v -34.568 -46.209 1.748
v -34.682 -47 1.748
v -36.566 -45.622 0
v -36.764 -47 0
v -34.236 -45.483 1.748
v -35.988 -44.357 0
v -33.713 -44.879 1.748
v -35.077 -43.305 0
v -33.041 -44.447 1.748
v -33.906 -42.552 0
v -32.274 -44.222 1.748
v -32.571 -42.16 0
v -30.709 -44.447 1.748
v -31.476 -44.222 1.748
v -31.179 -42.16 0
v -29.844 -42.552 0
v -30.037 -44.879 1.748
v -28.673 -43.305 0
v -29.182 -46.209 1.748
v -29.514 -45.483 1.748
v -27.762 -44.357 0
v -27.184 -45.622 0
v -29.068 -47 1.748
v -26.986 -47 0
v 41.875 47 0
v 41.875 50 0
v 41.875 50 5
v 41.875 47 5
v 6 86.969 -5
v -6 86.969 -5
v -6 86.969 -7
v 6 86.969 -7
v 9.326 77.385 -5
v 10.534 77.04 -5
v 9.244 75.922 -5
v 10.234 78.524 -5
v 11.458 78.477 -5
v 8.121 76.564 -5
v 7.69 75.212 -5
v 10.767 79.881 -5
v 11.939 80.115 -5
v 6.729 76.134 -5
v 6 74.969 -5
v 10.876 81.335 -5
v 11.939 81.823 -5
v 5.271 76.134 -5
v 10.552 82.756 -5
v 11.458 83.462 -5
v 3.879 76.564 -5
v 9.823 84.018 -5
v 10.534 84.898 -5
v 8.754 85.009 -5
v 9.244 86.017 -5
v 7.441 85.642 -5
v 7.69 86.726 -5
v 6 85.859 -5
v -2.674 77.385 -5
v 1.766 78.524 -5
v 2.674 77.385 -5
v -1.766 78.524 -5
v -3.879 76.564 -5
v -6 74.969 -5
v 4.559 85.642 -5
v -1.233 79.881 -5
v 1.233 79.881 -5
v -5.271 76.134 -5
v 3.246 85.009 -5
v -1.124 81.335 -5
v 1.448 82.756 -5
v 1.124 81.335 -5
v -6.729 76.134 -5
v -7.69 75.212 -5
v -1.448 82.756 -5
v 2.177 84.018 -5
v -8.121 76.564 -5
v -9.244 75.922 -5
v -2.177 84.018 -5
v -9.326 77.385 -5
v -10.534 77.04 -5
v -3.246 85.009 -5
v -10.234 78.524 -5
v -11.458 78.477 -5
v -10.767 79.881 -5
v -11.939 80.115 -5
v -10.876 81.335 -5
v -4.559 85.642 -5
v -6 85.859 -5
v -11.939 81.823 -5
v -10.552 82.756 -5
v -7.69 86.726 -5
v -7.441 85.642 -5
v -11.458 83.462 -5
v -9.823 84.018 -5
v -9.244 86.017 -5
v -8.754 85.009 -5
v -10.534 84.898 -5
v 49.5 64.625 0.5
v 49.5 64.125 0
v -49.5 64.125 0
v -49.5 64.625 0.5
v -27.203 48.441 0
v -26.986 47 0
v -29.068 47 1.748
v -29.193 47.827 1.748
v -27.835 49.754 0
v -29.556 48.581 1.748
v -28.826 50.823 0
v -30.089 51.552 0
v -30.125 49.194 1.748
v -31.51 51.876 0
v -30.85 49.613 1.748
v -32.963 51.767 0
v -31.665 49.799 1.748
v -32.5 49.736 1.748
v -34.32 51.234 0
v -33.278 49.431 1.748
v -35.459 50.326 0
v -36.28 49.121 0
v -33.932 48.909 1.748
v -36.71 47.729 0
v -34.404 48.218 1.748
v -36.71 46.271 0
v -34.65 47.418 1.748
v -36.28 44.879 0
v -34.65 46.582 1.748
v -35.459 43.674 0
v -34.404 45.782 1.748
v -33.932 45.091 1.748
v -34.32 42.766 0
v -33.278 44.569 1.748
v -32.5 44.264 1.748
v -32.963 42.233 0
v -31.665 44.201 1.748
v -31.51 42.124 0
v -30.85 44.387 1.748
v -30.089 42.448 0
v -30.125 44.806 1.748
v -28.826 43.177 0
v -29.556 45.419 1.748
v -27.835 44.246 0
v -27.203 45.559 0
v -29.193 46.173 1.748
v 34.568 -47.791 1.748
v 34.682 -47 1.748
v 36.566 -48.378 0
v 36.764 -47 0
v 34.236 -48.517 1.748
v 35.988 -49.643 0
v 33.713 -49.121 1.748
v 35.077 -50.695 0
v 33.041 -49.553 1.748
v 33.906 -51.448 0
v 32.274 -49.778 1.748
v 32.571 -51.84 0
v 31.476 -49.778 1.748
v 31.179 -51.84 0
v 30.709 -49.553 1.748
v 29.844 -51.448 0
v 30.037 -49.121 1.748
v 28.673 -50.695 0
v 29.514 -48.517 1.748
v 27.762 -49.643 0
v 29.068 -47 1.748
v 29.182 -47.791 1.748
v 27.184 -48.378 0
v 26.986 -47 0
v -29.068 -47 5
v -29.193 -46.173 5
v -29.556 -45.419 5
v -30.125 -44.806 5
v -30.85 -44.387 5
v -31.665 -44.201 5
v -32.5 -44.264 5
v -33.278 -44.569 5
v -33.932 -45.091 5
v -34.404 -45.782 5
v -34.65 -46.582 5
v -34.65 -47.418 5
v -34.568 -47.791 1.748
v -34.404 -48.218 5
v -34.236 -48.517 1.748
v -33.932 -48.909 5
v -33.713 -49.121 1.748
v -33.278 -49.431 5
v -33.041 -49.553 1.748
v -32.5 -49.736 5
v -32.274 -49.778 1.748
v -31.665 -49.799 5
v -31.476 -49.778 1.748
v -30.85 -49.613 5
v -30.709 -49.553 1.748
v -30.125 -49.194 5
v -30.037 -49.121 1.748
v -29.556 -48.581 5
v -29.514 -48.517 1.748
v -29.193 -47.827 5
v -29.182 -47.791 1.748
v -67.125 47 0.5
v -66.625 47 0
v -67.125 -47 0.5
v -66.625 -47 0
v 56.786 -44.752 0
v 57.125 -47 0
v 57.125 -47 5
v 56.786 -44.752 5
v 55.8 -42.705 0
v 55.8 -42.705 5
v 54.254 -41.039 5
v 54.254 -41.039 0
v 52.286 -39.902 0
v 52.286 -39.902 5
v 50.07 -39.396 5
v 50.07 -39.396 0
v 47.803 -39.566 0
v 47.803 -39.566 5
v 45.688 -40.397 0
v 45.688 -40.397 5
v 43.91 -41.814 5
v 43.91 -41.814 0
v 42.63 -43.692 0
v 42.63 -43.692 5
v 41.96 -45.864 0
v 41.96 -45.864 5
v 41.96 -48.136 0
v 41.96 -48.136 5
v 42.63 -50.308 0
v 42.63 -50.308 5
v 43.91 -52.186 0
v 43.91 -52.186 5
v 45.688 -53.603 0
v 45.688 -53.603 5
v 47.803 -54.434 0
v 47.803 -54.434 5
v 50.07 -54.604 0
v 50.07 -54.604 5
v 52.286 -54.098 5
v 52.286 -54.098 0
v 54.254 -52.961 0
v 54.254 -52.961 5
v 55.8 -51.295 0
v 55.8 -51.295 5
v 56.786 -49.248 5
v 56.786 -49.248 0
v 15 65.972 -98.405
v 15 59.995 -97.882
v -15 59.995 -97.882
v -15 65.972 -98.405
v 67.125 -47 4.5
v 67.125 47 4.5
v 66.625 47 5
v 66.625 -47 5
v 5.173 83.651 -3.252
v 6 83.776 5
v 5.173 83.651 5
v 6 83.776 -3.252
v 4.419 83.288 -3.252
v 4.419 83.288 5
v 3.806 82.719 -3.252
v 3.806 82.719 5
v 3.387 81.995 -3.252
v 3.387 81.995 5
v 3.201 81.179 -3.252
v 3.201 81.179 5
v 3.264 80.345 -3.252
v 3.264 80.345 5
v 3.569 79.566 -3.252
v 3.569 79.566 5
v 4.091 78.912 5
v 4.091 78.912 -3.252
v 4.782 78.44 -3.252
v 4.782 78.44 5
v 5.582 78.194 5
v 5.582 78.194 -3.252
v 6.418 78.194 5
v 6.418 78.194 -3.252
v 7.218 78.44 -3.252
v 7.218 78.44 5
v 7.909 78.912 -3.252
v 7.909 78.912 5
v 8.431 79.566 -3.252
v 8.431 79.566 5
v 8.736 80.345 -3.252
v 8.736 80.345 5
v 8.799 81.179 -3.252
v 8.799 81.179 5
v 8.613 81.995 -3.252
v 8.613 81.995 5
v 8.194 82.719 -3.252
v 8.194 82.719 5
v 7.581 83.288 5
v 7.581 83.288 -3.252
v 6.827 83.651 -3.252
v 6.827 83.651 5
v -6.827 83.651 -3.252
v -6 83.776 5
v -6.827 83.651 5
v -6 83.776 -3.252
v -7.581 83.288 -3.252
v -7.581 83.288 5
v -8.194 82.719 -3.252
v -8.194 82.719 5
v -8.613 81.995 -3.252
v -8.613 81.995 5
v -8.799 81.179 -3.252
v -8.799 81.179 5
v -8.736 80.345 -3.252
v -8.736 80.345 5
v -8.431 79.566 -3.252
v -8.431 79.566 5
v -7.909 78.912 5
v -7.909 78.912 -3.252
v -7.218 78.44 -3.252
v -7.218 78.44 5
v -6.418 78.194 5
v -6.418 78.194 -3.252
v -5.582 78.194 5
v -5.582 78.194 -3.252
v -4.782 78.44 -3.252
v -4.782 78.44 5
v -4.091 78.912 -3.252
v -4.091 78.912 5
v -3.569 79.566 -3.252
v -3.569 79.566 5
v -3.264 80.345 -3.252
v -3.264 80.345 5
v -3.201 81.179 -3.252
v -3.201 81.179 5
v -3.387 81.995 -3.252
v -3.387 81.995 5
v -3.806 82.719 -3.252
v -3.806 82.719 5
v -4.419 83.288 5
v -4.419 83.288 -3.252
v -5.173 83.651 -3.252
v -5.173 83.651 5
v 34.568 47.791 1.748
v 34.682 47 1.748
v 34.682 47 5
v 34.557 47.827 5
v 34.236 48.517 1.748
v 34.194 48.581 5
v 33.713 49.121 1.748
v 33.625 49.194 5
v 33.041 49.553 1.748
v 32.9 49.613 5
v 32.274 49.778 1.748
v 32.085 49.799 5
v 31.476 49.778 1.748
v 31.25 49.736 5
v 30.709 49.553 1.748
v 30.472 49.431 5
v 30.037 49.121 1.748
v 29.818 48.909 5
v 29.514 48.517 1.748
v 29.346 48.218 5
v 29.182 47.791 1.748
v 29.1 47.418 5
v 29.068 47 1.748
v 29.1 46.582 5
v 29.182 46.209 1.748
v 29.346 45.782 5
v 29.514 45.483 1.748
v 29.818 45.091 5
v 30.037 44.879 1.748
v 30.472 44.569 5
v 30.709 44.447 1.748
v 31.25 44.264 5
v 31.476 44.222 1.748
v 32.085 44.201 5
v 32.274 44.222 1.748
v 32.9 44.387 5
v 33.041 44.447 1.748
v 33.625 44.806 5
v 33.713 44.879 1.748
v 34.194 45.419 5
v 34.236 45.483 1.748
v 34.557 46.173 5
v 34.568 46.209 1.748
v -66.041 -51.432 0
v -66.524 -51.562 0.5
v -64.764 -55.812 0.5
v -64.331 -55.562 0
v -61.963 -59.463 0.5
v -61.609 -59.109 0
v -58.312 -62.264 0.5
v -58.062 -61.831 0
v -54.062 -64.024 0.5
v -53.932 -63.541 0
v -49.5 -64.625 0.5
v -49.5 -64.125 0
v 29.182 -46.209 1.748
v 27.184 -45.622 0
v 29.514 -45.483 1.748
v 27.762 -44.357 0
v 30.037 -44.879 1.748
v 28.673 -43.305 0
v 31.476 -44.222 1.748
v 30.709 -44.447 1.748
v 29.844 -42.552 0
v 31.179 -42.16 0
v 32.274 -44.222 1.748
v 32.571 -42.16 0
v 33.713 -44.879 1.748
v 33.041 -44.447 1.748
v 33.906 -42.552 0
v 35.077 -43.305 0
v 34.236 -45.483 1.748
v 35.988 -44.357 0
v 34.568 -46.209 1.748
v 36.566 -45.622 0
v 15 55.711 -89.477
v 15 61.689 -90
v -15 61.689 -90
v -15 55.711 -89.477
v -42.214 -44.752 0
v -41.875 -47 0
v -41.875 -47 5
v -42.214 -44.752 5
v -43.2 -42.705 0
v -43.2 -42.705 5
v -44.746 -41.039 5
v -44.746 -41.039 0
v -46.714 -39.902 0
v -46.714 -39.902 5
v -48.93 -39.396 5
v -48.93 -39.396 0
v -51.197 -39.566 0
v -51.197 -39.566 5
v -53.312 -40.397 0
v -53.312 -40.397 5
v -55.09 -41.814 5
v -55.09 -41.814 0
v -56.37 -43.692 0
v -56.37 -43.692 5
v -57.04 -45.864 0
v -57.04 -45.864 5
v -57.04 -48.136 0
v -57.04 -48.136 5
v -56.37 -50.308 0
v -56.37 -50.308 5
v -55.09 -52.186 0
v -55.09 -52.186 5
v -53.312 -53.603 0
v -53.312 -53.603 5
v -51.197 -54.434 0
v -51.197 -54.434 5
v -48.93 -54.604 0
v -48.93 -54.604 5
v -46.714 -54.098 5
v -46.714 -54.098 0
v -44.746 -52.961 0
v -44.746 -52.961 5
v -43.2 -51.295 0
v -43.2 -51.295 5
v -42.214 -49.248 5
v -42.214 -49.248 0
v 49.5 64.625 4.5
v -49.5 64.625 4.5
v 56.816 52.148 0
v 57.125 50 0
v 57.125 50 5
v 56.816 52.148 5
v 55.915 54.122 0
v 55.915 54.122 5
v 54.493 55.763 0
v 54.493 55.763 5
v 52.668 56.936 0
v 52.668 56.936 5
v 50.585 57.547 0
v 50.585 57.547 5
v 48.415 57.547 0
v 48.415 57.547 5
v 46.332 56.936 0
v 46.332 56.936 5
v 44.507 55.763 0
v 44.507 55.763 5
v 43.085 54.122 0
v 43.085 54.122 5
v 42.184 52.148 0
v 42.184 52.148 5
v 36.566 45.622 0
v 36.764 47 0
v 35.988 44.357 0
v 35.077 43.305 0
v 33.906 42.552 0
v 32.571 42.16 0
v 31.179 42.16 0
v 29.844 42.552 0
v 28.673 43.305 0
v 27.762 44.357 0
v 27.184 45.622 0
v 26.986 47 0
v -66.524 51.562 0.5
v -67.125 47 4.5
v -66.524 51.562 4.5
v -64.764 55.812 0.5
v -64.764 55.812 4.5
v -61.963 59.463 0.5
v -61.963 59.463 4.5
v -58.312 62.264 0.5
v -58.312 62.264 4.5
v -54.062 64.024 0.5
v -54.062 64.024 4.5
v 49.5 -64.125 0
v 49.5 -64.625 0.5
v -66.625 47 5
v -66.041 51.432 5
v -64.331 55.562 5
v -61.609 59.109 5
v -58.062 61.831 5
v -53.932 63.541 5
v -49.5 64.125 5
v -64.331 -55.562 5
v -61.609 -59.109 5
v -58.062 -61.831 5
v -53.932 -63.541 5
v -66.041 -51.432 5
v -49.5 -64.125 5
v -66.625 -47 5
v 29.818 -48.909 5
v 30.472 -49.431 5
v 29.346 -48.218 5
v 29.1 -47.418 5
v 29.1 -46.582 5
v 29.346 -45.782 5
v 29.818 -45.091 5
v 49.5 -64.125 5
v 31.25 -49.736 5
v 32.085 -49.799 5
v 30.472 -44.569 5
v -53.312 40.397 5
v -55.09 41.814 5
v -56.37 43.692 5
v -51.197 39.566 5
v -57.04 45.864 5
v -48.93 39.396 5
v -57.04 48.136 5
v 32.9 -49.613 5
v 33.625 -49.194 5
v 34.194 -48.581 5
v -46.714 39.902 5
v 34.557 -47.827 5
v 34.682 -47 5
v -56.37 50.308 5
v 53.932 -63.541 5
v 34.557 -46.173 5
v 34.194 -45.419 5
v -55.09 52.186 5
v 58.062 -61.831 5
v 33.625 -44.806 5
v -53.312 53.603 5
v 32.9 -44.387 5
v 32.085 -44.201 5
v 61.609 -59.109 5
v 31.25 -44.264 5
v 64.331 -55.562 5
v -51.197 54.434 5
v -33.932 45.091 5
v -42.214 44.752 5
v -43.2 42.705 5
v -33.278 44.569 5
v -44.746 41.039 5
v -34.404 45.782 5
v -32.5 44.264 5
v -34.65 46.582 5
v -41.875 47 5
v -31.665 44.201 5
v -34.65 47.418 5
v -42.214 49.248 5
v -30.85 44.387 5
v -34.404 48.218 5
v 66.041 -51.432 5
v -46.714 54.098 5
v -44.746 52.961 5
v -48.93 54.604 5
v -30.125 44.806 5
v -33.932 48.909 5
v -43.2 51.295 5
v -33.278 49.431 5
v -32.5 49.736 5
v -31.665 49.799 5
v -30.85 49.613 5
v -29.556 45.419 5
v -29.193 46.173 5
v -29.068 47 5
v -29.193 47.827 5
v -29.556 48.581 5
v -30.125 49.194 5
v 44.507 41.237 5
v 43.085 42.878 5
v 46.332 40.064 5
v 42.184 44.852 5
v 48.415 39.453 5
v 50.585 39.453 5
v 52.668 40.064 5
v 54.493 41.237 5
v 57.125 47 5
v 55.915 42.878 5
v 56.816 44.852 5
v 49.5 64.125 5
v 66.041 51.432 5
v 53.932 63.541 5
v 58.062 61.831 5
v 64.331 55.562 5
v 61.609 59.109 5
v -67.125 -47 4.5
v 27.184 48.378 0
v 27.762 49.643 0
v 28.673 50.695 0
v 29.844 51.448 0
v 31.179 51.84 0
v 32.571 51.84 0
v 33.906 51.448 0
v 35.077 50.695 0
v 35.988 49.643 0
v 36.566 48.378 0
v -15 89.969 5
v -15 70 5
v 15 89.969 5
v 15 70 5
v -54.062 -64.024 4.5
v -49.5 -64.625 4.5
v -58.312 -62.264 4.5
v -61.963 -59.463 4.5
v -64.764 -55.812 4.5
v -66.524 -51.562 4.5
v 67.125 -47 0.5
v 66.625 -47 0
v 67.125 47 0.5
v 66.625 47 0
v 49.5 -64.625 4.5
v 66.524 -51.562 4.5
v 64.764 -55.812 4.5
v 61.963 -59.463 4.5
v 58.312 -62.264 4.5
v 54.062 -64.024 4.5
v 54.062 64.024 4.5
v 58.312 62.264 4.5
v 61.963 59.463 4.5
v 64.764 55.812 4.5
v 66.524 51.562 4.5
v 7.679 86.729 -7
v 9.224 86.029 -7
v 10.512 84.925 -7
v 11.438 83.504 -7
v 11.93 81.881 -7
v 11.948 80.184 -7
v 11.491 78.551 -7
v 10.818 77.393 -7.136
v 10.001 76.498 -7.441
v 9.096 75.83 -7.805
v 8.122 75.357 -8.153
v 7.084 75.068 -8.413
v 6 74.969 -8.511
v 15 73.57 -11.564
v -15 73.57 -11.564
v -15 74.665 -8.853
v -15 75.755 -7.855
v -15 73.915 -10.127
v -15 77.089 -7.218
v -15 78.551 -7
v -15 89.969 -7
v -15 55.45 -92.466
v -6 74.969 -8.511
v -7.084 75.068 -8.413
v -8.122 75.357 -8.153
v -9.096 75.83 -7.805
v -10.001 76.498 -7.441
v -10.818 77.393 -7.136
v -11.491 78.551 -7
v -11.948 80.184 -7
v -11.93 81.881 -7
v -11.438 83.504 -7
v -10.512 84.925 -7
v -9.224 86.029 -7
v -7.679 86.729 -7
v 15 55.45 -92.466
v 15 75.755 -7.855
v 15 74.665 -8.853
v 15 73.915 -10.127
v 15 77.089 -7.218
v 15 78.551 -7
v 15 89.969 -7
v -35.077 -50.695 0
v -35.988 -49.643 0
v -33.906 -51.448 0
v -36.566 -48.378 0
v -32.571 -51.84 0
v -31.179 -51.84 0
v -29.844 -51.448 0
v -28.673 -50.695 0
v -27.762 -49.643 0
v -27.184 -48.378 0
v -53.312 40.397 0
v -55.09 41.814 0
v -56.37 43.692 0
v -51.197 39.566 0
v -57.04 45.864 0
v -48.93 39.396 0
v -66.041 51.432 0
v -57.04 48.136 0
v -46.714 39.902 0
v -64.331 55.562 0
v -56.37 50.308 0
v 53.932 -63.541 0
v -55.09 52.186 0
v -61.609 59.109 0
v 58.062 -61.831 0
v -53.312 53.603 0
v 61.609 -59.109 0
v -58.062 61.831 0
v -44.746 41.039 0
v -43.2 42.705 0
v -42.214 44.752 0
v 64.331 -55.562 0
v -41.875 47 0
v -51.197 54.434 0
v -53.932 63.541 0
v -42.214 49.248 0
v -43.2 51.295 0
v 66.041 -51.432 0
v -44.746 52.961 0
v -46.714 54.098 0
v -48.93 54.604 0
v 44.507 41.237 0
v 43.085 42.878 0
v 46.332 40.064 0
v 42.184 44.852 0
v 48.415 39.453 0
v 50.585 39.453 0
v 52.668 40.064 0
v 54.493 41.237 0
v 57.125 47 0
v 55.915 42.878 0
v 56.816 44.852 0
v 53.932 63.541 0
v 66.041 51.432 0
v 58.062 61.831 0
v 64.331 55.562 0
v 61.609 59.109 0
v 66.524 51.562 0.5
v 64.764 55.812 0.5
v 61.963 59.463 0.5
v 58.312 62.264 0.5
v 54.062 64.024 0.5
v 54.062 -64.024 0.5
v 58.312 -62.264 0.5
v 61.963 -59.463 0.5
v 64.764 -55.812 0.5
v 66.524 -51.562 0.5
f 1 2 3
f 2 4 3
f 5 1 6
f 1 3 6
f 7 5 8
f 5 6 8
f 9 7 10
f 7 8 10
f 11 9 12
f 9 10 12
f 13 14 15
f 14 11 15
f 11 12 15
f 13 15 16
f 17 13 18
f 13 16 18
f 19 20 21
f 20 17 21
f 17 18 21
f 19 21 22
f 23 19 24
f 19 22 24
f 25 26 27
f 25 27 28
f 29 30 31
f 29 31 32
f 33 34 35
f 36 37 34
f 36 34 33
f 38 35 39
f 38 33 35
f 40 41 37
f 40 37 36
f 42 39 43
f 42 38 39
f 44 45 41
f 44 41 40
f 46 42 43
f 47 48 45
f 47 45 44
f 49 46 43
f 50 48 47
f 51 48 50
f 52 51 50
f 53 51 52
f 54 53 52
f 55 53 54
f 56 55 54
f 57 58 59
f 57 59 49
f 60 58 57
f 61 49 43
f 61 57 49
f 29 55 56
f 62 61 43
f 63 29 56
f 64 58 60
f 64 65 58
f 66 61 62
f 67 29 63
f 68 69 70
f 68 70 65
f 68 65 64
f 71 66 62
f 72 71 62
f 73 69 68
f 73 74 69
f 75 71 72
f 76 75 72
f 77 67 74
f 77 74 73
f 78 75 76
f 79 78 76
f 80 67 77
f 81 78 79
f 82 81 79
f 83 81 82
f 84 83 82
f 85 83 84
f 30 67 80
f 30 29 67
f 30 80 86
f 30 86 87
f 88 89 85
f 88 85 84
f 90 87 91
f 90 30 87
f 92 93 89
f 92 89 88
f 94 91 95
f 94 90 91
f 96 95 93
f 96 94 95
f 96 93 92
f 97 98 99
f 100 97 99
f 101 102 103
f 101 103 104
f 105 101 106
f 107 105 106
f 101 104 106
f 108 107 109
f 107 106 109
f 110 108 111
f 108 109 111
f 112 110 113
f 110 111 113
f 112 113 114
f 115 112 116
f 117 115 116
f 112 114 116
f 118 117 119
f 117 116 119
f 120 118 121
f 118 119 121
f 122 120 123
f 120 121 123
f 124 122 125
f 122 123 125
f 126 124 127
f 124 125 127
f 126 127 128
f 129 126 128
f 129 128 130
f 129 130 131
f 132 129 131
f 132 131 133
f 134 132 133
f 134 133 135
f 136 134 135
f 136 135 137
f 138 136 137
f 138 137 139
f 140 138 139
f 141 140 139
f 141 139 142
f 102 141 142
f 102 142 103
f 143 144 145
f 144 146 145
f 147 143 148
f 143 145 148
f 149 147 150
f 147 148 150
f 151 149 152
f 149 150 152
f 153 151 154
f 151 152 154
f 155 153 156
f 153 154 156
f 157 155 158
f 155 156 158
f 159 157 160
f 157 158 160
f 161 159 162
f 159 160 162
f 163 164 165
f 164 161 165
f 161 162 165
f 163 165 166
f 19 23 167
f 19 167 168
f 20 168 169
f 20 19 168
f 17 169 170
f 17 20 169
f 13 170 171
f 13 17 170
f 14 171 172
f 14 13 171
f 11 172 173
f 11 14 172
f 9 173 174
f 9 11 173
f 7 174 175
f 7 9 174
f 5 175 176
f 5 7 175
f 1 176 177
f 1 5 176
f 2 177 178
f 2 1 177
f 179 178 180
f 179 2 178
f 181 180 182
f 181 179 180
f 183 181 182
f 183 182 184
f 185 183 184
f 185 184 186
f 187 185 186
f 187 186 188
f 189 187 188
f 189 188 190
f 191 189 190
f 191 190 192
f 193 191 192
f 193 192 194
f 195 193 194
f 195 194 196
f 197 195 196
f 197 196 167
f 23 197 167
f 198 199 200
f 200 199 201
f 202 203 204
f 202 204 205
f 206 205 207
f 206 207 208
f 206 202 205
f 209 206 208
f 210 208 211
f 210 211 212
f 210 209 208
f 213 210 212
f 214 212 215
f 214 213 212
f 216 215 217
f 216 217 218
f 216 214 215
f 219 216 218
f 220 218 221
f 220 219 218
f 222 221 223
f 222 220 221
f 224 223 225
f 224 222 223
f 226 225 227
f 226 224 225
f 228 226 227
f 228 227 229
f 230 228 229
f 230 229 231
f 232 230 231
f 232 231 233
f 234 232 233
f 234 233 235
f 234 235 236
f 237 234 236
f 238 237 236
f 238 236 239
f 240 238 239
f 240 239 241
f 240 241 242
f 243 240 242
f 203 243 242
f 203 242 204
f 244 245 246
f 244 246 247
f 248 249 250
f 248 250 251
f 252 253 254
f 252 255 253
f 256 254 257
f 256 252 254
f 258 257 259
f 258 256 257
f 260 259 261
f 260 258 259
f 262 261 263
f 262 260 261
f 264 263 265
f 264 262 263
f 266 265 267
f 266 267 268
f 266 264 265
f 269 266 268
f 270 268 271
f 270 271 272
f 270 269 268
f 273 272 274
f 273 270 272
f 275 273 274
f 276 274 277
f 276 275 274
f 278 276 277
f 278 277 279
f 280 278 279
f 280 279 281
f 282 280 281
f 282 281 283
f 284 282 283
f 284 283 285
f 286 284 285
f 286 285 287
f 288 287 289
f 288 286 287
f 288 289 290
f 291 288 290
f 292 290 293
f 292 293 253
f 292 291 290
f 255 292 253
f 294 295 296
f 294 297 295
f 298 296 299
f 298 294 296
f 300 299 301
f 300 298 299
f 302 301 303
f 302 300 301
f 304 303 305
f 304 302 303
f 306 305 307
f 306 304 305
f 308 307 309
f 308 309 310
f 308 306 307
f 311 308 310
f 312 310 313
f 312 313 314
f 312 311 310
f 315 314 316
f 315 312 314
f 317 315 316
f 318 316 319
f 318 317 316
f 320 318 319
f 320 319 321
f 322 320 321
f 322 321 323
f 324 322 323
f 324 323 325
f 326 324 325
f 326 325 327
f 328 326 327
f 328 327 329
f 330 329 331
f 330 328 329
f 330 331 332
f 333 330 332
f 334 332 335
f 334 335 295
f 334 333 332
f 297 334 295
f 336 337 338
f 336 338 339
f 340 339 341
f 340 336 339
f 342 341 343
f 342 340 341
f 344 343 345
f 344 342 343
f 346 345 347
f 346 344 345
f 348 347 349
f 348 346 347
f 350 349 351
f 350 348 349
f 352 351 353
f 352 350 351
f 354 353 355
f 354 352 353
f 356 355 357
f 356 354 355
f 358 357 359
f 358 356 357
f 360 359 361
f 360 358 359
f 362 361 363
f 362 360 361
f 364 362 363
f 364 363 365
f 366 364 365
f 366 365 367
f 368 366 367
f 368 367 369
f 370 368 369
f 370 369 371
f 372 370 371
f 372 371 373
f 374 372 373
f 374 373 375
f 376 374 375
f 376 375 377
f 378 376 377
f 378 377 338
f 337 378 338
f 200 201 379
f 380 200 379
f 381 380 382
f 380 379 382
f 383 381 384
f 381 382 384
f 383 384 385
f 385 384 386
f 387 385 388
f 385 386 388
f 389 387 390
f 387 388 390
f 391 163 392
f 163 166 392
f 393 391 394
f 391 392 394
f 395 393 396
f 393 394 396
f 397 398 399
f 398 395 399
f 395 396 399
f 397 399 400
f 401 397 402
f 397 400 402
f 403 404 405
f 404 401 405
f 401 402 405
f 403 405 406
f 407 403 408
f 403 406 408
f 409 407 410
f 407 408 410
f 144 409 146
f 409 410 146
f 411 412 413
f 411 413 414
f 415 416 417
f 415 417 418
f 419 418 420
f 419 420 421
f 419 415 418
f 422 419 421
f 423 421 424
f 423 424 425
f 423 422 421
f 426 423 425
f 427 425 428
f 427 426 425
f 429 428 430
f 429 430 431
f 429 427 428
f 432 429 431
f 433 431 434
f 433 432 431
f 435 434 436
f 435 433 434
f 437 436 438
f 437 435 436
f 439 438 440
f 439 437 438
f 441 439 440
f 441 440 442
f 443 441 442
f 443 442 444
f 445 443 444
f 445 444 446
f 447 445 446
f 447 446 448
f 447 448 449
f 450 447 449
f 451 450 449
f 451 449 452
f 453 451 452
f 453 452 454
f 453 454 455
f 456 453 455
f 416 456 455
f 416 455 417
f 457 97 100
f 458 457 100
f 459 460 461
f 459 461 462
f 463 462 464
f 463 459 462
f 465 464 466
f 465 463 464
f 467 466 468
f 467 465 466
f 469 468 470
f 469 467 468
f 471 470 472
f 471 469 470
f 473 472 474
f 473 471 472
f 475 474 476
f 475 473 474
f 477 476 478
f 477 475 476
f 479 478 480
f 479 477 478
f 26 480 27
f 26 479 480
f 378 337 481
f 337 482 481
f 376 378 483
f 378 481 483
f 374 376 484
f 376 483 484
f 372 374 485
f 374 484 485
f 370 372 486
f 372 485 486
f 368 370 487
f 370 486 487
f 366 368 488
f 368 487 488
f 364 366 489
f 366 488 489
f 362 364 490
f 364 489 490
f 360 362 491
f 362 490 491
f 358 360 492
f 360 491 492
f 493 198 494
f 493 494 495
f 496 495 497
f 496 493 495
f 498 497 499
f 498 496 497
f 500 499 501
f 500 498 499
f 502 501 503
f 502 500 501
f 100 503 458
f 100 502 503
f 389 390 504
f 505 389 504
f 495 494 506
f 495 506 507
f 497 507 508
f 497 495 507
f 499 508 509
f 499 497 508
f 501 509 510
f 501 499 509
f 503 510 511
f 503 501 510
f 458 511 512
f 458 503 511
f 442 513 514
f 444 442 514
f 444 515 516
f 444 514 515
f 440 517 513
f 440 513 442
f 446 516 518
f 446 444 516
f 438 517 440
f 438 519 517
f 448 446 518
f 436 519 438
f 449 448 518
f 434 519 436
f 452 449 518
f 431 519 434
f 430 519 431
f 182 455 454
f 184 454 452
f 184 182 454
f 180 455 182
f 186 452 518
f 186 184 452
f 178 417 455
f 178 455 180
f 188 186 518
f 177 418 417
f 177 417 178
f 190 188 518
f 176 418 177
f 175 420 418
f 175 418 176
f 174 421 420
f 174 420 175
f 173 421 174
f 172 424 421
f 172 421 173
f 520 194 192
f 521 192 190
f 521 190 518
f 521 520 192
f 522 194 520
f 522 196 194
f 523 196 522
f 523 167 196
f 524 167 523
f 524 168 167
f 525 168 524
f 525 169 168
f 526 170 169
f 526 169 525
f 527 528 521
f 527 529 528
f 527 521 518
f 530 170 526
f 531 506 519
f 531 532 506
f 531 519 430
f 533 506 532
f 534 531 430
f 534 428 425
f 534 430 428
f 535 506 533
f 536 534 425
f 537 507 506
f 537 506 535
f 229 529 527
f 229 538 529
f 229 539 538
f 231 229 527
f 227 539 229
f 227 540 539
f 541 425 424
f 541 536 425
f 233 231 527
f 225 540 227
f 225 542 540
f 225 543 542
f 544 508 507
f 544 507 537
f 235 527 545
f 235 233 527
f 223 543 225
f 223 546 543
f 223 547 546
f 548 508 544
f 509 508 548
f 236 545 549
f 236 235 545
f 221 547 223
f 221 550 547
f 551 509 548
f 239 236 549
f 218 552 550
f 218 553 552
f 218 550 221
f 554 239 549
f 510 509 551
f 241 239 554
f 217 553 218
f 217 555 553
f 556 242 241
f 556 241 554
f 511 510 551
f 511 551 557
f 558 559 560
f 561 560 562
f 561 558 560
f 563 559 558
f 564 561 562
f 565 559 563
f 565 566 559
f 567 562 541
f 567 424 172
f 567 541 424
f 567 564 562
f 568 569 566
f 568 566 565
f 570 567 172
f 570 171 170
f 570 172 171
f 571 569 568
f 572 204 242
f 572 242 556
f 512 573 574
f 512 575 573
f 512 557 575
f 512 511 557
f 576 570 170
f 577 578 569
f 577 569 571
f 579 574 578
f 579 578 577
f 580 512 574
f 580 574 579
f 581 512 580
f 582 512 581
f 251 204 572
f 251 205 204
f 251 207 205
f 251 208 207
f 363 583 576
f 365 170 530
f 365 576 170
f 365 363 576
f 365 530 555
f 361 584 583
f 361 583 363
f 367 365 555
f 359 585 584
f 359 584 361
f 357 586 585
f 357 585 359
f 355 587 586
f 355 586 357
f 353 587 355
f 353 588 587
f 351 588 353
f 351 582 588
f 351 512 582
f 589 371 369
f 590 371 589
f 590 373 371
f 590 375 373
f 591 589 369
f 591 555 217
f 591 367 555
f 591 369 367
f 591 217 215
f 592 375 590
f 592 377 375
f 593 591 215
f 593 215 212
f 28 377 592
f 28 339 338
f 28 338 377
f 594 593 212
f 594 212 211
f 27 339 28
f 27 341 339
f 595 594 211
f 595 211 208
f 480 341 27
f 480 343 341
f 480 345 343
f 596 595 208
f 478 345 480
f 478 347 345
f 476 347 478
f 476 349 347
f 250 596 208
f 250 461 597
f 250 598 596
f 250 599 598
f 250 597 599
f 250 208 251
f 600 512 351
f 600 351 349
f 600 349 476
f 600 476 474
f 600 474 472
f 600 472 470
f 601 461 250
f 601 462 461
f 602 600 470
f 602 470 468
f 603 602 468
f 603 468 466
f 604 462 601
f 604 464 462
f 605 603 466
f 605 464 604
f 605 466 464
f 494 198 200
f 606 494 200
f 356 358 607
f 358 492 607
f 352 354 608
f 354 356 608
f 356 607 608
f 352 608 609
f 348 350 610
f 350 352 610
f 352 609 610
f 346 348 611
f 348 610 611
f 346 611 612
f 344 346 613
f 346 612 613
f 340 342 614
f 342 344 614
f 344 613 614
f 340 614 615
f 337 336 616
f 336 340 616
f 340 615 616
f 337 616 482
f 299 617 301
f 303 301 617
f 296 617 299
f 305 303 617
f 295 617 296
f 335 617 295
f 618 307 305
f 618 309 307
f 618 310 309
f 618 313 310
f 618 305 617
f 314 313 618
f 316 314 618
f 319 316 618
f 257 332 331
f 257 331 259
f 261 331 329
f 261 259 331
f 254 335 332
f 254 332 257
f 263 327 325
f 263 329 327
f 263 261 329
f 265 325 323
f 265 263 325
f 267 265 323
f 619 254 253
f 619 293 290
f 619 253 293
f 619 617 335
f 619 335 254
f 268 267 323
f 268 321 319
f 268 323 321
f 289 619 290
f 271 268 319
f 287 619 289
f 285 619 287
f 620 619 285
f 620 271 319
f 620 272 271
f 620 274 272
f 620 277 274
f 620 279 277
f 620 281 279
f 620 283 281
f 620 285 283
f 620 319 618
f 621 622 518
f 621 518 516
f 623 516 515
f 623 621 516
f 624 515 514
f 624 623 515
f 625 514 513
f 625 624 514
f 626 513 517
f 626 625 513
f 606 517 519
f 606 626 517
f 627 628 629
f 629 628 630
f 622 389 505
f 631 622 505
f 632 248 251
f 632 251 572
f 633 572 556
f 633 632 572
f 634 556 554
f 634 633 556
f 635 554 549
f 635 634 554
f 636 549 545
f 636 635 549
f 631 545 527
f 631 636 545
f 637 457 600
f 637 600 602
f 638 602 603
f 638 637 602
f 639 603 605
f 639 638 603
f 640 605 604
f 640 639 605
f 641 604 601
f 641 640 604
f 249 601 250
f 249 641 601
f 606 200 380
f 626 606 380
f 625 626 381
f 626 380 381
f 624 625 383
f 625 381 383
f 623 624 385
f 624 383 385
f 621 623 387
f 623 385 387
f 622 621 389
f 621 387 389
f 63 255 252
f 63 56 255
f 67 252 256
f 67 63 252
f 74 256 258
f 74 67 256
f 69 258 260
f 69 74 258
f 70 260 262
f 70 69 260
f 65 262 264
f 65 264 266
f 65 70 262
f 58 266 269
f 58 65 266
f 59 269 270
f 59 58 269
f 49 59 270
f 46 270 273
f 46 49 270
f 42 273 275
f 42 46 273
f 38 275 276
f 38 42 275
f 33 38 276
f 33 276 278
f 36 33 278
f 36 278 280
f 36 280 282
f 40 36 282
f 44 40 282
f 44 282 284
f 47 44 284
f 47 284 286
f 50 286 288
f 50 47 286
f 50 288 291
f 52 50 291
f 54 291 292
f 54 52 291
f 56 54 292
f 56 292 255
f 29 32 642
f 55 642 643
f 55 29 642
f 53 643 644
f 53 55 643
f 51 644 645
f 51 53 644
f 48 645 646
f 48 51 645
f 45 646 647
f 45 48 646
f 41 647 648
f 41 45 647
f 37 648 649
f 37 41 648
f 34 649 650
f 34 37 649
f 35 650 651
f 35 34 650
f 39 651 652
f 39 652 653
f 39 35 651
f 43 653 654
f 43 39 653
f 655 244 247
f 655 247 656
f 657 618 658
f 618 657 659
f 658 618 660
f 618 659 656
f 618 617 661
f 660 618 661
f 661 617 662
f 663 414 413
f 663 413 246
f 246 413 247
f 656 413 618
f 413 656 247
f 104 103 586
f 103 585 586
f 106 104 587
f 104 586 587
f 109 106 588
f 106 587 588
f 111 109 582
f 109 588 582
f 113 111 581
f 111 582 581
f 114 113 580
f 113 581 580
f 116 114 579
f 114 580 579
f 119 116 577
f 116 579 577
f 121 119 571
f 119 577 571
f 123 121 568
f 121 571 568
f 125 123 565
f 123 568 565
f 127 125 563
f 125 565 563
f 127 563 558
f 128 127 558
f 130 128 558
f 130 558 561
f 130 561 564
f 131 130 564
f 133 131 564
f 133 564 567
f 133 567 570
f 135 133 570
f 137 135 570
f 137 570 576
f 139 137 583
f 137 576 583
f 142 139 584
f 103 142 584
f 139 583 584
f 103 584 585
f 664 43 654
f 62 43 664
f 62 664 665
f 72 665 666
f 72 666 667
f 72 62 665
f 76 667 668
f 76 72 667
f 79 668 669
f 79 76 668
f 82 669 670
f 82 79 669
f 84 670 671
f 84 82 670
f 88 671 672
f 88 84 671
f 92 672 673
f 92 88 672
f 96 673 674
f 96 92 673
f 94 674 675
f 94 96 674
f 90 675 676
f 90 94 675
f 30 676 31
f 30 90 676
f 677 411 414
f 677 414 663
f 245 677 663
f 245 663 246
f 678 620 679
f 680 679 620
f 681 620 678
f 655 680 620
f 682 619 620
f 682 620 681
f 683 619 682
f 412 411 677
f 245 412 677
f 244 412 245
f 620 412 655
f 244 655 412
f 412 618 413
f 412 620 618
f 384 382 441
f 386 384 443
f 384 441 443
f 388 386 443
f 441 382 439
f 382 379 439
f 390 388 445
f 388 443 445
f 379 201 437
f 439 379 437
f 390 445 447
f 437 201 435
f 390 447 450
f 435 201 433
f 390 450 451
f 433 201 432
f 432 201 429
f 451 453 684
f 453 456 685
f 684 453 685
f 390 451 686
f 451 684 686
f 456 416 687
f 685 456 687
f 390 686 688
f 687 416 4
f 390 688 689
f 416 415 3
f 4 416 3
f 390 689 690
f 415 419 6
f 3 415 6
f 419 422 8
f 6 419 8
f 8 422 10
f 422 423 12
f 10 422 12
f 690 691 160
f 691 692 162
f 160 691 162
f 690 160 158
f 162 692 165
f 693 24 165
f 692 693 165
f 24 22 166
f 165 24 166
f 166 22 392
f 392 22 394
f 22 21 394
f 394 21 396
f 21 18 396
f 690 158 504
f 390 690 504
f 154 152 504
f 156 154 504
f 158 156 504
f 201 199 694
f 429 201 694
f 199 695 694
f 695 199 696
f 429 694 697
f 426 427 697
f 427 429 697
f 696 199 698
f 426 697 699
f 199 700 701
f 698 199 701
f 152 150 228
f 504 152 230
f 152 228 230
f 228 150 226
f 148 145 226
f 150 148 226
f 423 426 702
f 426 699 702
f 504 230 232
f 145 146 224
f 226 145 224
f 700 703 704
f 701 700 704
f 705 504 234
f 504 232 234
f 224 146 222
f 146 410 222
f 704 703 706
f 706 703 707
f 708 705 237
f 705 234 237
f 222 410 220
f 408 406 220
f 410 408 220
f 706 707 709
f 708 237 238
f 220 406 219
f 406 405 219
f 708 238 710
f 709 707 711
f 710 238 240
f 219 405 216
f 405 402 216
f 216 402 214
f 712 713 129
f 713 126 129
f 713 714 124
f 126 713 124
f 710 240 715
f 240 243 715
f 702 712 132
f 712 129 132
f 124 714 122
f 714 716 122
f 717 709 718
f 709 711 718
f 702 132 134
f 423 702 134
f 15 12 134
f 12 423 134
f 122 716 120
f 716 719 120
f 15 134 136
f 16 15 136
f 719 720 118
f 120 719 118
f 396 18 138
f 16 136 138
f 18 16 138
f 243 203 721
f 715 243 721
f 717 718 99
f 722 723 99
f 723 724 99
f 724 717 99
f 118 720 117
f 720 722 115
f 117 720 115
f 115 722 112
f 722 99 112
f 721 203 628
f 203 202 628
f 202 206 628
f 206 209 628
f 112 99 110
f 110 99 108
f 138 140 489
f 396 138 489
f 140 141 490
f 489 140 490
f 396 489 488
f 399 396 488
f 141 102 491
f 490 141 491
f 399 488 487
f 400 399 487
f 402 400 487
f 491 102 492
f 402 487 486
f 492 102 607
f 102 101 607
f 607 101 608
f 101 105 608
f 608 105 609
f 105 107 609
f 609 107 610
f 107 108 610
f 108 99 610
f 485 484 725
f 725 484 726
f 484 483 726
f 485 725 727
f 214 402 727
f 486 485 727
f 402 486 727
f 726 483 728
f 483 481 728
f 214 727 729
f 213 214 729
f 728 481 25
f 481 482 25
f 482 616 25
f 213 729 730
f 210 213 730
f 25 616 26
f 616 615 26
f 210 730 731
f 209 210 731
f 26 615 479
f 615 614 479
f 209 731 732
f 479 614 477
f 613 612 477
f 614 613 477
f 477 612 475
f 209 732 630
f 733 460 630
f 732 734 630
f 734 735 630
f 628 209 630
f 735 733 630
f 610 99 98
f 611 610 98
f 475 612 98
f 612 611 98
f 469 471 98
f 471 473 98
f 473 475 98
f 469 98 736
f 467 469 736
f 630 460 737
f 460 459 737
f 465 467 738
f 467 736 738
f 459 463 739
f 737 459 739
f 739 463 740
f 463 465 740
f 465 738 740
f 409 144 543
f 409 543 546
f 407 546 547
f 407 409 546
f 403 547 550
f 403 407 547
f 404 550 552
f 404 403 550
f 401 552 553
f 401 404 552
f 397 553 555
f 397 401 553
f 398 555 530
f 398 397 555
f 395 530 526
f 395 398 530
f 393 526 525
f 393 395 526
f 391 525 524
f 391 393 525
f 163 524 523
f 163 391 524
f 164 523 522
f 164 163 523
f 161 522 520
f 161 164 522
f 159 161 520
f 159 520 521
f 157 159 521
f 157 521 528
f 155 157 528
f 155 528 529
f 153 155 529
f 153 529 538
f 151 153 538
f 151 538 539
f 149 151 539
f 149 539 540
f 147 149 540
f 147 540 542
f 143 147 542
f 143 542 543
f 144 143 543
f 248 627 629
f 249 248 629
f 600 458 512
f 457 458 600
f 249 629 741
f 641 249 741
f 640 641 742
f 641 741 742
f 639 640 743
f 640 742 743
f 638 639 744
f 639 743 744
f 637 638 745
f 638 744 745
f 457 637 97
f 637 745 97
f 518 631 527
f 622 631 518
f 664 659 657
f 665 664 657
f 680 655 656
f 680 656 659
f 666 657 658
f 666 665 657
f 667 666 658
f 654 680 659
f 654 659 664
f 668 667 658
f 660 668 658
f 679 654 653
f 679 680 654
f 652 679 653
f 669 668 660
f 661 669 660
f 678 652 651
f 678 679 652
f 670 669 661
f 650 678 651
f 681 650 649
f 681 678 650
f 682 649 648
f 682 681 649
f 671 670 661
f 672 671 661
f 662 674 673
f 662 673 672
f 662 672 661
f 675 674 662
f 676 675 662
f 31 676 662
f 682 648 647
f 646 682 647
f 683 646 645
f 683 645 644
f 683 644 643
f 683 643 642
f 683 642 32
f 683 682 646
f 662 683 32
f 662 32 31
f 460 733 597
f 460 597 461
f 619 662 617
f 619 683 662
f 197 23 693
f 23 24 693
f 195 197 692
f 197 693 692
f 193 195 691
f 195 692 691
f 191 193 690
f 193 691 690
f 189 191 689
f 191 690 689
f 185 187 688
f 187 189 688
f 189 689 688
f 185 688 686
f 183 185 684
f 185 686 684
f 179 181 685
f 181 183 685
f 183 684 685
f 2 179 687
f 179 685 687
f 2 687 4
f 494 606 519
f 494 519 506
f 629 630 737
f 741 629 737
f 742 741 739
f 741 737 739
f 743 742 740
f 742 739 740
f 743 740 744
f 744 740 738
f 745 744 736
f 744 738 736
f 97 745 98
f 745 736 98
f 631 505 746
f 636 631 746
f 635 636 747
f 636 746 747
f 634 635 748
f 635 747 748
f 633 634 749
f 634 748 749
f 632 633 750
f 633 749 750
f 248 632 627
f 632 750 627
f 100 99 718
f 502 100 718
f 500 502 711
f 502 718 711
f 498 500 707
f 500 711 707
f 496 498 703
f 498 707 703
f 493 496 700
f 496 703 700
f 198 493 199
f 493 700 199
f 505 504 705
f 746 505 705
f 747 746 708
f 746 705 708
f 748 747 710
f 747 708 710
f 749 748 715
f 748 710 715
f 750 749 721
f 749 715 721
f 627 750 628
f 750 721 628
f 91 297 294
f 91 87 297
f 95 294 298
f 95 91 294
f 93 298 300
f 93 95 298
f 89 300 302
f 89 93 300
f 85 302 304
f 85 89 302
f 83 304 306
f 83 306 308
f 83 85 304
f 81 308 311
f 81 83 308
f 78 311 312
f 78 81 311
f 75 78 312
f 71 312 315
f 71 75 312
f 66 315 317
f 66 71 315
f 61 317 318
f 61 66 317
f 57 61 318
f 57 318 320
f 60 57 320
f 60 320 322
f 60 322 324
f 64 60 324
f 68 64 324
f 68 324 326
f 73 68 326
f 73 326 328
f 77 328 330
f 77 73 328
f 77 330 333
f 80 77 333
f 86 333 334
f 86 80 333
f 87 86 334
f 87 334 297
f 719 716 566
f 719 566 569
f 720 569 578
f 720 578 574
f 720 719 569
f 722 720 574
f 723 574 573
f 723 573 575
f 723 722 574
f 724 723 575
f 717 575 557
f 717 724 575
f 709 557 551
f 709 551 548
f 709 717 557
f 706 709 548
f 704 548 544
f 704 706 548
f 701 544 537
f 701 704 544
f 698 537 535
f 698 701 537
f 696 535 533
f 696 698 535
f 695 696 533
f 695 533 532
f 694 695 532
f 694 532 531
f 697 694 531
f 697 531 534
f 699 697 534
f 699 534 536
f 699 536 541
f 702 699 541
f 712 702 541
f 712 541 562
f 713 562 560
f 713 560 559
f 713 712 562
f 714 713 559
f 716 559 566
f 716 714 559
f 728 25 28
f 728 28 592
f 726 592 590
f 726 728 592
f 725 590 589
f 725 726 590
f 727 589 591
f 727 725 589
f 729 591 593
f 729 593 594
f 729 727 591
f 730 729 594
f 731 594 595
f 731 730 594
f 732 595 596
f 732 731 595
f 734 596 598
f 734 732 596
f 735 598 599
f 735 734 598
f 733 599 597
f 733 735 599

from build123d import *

# Parameters (mm, degrees)
SKETCH1_R                                          = 7.625
BOSS_EXTRUDE1_DEPTH                                = 5
CSK_FOR_10_FLAT_HEAD_MACHINE_SCREW_100_D           = 5.6134
CSK_FOR_10_FLAT_HEAD_MACHINE_SCREW_100_CSINK_D     = 9.779
CSK_FOR_10_FLAT_HEAD_MACHINE_SCREW_100_CSINK_ANGLE = 100
MIRROR1_START                                      = 1.747676612
MIRROR1_OUTLINE_R                                  = 7.625
MIRROR1_OUTLINE_R_2                                = 2.8067
MIRROR1_DEPTH                                      = 3.252323388
MIRROR1_2_OUTLINE_R                                = 7.625
MIRROR1_2_DEPTH                                    = 1.747676612
BOSS_EXTRUDE2_DEPTH                                = 15
CUT_EXTRUDE1_START                                 = -10
CUT_EXTRUDE1_DEPTH                                 = 143.620092016
CSK_FOR_10_FLAT_HEAD_MACHINE_SCREW_2_AT_COUNT      = 2
CSK_FOR_10_FLAT_HEAD_MACHINE_SCREW_2_AT_PITCH      = 12
CUT_EXTRUDE2_DEPTH                                 = 150.277724809
CHAMFER1_SIZE                                      = 0.5


with BuildPart() as part:
    # Sketch1 → Boss-Extrude1 (new body)
    with BuildSketch(Plane.XY):
        with BuildLine():
            Line((0, 0), (-67.125, 0))
            Line((-67.125, 0), (-67.125, 47))
            ThreePointArc((-67.125, 47), (-61.962757018, 59.462757018), (-49.5, 64.625))
            Line((-49.5, 64.625), (0, 64.625))
            Line((0, 64.625), (0, 0))
        make_face()
        with Locations((-49.5, 47)):
            Circle(SKETCH1_R, mode=Mode.SUBTRACT)
    extrude(amount=BOSS_EXTRUDE1_DEPTH)

    # CSK for _10 Flat Head Machine Screw _100 (through all)
    with Locations(Plane(origin=(-31.875, 47, 0), x_dir=(-1, 0, 0), z_dir=(0, 0, -1))):
        with Locations((0, 0)):
            CounterSinkHole(CSK_FOR_10_FLAT_HEAD_MACHINE_SCREW_100_D / 2, CSK_FOR_10_FLAT_HEAD_MACHINE_SCREW_100_CSINK_D / 2, counter_sink_angle=CSK_FOR_10_FLAT_HEAD_MACHINE_SCREW_100_CSINK_ANGLE)

    # Mirror1: read off the stored shape, not the designer's step
    # Mirror1 outline → Mirror1 (add)
    with BuildSketch(Plane.XY.offset(MIRROR1_START)):
        with BuildLine():
            Line((49.5, 64.625), (0, 64.625))
            Line((0, 64.625), (0, 0))
            Line((0, 0), (-67.125, 0))
            Line((-67.125, 0), (-67.125, -47))
            ThreePointArc((-67.125, -47), (-61.962757018, -59.462757018), (-49.5, -64.625))
            Line((-49.5, -64.625), (49.5, -64.625))
            ThreePointArc((49.5, -64.625), (61.962757018, -59.462757018), (67.125, -47))
            Line((67.125, -47), (67.125, 47))
            ThreePointArc((67.125, 47), (61.962757018, 59.462757018), (49.5, 64.625))
        make_face()
        with Locations((-49.5, -47)):
            Circle(MIRROR1_OUTLINE_R, mode=Mode.SUBTRACT)
        with Locations((-31.875, -47)):
            Circle(MIRROR1_OUTLINE_R_2, mode=Mode.SUBTRACT)
        with Locations((31.875, -47)):
            Circle(MIRROR1_OUTLINE_R_2, mode=Mode.SUBTRACT)
        with Locations((49.5, -47)):
            Circle(MIRROR1_OUTLINE_R, mode=Mode.SUBTRACT)
        with Locations((31.875, 47)):
            Circle(MIRROR1_OUTLINE_R_2, mode=Mode.SUBTRACT)
        with Locations((49.5, 47)):
            Circle(MIRROR1_OUTLINE_R, mode=Mode.SUBTRACT)
    extrude(amount=MIRROR1_DEPTH)

    # Mirror1 2 outline → Mirror1 2 (add)
    with BuildSketch(Plane.XY):
        with BuildLine():
            Line((49.5, 64.625), (0, 64.625))
            Line((0, 64.625), (0, 0))
            Line((0, 0), (-67.125, 0))
            Line((-67.125, 0), (-67.125, -47))
            ThreePointArc((-67.125, -47), (-61.962757018, -59.462757018), (-49.5, -64.625))
            Line((-49.5, -64.625), (49.5, -64.625))
            ThreePointArc((49.5, -64.625), (61.962757018, -59.462757018), (67.125, -47))
            Line((67.125, -47), (67.125, 47))
            ThreePointArc((67.125, 47), (61.962757018, 59.462757018), (49.5, 64.625))
        make_face()
        with Locations((-49.5, -47)):
            Circle(MIRROR1_2_OUTLINE_R, mode=Mode.SUBTRACT)
        with Locations((49.5, -47)):
            Circle(MIRROR1_2_OUTLINE_R, mode=Mode.SUBTRACT)
        with Locations((49.5, 47)):
            Circle(MIRROR1_2_OUTLINE_R, mode=Mode.SUBTRACT)
    extrude(amount=MIRROR1_2_DEPTH)

    # Mirror1 3: loft between two sections, ruled curve by curve
    mirror1_3_from = [
        Edge.make_three_point_arc((29.0683, 47, 1.747676712), (31.875, 49.8067, 1.747676712), (34.6817, 47, 1.747676712)),
        Edge.make_three_point_arc((34.6817, 47, 1.747676712), (31.875, 44.1933, 1.747676712), (29.0683, 47, 1.747676712)),
    ]
    mirror1_3_to = [
        Edge.make_three_point_arc((26.9855, 47, 0), (31.875, 51.8895, 0), (36.7645, 47, 0)),
        Edge.make_three_point_arc((36.7645, 47, 0), (31.875, 42.1105, 0), (26.9855, 47, 0)),
    ]
    mirror1_3 = Solid(Shell([*[Face.make_surface_from_curves(mirror1_3_from[k], mirror1_3_to[k]) for k in range(2)], Face(Wire(mirror1_3_from)), Face(Wire(mirror1_3_to))]))
    add(mirror1_3, mode=Mode.SUBTRACT)

    # Mirror1 4: loft between two sections, ruled curve by curve
    mirror1_4_from = [
        Edge.make_three_point_arc((-34.6817, -47, 1.747676712), (-31.875, -44.1933, 1.747676712), (-29.0683, -47, 1.747676712)),
        Edge.make_three_point_arc((-29.0683, -47, 1.747676712), (-31.875, -49.8067, 1.747676712), (-34.6817, -47, 1.747676712)),
    ]
    mirror1_4_to = [
        Edge.make_three_point_arc((-36.7645, -47, 0), (-31.875, -42.1105, 0), (-26.9855, -47, 0)),
        Edge.make_three_point_arc((-26.9855, -47, 0), (-31.875, -51.8895, 0), (-36.7645, -47, 0)),
    ]
    mirror1_4 = Solid(Shell([*[Face.make_surface_from_curves(mirror1_4_from[k], mirror1_4_to[k]) for k in range(2)], Face(Wire(mirror1_4_from)), Face(Wire(mirror1_4_to))]))
    add(mirror1_4, mode=Mode.SUBTRACT)

    # Mirror1 5: loft between two sections, ruled curve by curve
    mirror1_5_from = [
        Edge.make_three_point_arc((29.0683, -47, 1.747676712), (31.875, -44.1933, 1.747676712), (34.6817, -47, 1.747676712)),
        Edge.make_three_point_arc((34.6817, -47, 1.747676712), (31.875, -49.8067, 1.747676712), (29.0683, -47, 1.747676712)),
    ]
    mirror1_5_to = [
        Edge.make_three_point_arc((26.9855, -47, 0), (31.875, -42.1105, 0), (36.7645, -47, 0)),
        Edge.make_three_point_arc((36.7645, -47, 0), (31.875, -51.8895, 0), (26.9855, -47, 0)),
    ]
    mirror1_5 = Solid(Shell([*[Face.make_surface_from_curves(mirror1_5_from[k], mirror1_5_to[k]) for k in range(2)], Face(Wire(mirror1_5_from)), Face(Wire(mirror1_5_to))]))
    add(mirror1_5, mode=Mode.SUBTRACT)

    # Sketch8 → Cut-Extrude2 (cut, through all)
    with BuildSketch(Plane(origin=(0, 0, 0), x_dir=(-1, 0, 0), z_dir=(0, 0, -1))):
        with BuildLine():
            Line((-57.125, 47), (-57.125, 50))
            ThreePointArc((-57.125, 50), (-49.5, 57.625), (-41.875, 50))
            Line((-41.875, 50), (-41.875, 47))
            ThreePointArc((-41.875, 47), (-49.5, 39.375), (-57.125, 47))
        make_face()
    extrude(amount=-CUT_EXTRUDE2_DEPTH, mode=Mode.SUBTRACT)

    # Chamfer1
    chamfer1_edges = [part.edges().sort_by_distance(p)[0] for p in [
        (-61.962757018, 59.462757018, 5),
        (-67.125, 0, 5),
        (67.125, 0, 5),
        (61.962757018, 59.462757018, 5),
        (61.962757018, 59.462757018, 0),
        (67.125, 0, 0),
        (-61.962757018, -59.462757018, 5),
        (0, -64.625, 5),
        (0, -64.625, 0),
        (-61.962757018, -59.462757018, 0),
        (61.962757018, -59.462757018, 5),
        (61.962757018, -59.462757018, 0),
        (-67.125, 0, 0),
        (-61.962757018, 59.462757018, 0),
        (0, 64.625, 0),
        (0, 64.625, 5),
    ]]
    chamfer(chamfer1_edges, length=CHAMFER1_SIZE)


with BuildPart() as body_2:
    # Sketch2 → Boss-Extrude2 (new, symmetric)
    with BuildSketch(Plane(origin=(0, 0, 0), x_dir=(0, 0, -1), z_dir=(1, 0, 0))):
        with BuildLine():
            Line((-5, 70), (90, 61.688576965))
            Line((90, 61.688576965), (89.477065544, 55.711408776))
            Line((89.477065544, 55.711408776), (92.465649638, 55.449941548))
            Line((92.465649638, 55.449941548), (97.882401842, 59.995136325))
            Line((97.882401842, 59.995136325), (98.405336298, 65.972304514))
            Line((98.405336298, 65.972304514), (11.564221286, 73.569917605))
            ThreePointArc((11.564221286, 73.569917605), (8.313613316, 75.172940057), (7, 78.550891095))
            Line((7, 78.550891095), (7, 89.969235225))
            Line((7, 89.969235225), (-5, 89.969235225))
            Line((-5, 89.969235225), (-5, 75.019099188))
            Line((-5, 75.019099188), (-5, 70))
        make_face()
    extrude(amount=BOSS_EXTRUDE2_DEPTH, both=True)

    # Sketch3 → Cut-Extrude1 (cut, through all)
    with BuildSketch(Plane.XY.offset(5).offset(CUT_EXTRUDE1_START)):
        with BuildLine():
            Line((-6, 86.969235225), (6, 86.969235225))
            ThreePointArc((6, 86.969235225), (12, 80.969235225), (6, 74.969235225))
            Line((6, 74.969235225), (-6, 74.969235225))
            ThreePointArc((-6, 74.969235225), (-12, 80.969235225), (-6, 86.969235225))
        make_face()
    extrude(amount=-CUT_EXTRUDE1_DEPTH, mode=Mode.SUBTRACT)

    # Sketch4 → CSK for _10 Flat Head Machine Screw  2 (revolve, cut)
    with BuildSketch(Plane(origin=(-6, 80.969235225, -5), x_dir=(0, 1, 0), z_dir=(1, 0, 0))):
        Polygon((0, 0), (0, 10), (2.8067, 10), (2.8067, 1.747676712), (4.8895, 0), align=None)
    csk_for_10_flat_head_machine_screw_2 = revolve(axis=Axis((-6, 80.969235225, -11.35), (0, 0, 1)), mode=Mode.SUBTRACT)

    # CSK for _10 Flat Head Machine Screw 2 at: CSK for _10 Flat Head Machine Screw  2 ×2
    with Locations(*[(i * CSK_FOR_10_FLAT_HEAD_MACHINE_SCREW_2_AT_PITCH, 0, 0) for i in range(1, CSK_FOR_10_FLAT_HEAD_MACHINE_SCREW_2_AT_COUNT)]):
        add(csk_for_10_flat_head_machine_screw_2, mode=Mode.SUBTRACT)


solid = Compound([part.part, body_2.part])
